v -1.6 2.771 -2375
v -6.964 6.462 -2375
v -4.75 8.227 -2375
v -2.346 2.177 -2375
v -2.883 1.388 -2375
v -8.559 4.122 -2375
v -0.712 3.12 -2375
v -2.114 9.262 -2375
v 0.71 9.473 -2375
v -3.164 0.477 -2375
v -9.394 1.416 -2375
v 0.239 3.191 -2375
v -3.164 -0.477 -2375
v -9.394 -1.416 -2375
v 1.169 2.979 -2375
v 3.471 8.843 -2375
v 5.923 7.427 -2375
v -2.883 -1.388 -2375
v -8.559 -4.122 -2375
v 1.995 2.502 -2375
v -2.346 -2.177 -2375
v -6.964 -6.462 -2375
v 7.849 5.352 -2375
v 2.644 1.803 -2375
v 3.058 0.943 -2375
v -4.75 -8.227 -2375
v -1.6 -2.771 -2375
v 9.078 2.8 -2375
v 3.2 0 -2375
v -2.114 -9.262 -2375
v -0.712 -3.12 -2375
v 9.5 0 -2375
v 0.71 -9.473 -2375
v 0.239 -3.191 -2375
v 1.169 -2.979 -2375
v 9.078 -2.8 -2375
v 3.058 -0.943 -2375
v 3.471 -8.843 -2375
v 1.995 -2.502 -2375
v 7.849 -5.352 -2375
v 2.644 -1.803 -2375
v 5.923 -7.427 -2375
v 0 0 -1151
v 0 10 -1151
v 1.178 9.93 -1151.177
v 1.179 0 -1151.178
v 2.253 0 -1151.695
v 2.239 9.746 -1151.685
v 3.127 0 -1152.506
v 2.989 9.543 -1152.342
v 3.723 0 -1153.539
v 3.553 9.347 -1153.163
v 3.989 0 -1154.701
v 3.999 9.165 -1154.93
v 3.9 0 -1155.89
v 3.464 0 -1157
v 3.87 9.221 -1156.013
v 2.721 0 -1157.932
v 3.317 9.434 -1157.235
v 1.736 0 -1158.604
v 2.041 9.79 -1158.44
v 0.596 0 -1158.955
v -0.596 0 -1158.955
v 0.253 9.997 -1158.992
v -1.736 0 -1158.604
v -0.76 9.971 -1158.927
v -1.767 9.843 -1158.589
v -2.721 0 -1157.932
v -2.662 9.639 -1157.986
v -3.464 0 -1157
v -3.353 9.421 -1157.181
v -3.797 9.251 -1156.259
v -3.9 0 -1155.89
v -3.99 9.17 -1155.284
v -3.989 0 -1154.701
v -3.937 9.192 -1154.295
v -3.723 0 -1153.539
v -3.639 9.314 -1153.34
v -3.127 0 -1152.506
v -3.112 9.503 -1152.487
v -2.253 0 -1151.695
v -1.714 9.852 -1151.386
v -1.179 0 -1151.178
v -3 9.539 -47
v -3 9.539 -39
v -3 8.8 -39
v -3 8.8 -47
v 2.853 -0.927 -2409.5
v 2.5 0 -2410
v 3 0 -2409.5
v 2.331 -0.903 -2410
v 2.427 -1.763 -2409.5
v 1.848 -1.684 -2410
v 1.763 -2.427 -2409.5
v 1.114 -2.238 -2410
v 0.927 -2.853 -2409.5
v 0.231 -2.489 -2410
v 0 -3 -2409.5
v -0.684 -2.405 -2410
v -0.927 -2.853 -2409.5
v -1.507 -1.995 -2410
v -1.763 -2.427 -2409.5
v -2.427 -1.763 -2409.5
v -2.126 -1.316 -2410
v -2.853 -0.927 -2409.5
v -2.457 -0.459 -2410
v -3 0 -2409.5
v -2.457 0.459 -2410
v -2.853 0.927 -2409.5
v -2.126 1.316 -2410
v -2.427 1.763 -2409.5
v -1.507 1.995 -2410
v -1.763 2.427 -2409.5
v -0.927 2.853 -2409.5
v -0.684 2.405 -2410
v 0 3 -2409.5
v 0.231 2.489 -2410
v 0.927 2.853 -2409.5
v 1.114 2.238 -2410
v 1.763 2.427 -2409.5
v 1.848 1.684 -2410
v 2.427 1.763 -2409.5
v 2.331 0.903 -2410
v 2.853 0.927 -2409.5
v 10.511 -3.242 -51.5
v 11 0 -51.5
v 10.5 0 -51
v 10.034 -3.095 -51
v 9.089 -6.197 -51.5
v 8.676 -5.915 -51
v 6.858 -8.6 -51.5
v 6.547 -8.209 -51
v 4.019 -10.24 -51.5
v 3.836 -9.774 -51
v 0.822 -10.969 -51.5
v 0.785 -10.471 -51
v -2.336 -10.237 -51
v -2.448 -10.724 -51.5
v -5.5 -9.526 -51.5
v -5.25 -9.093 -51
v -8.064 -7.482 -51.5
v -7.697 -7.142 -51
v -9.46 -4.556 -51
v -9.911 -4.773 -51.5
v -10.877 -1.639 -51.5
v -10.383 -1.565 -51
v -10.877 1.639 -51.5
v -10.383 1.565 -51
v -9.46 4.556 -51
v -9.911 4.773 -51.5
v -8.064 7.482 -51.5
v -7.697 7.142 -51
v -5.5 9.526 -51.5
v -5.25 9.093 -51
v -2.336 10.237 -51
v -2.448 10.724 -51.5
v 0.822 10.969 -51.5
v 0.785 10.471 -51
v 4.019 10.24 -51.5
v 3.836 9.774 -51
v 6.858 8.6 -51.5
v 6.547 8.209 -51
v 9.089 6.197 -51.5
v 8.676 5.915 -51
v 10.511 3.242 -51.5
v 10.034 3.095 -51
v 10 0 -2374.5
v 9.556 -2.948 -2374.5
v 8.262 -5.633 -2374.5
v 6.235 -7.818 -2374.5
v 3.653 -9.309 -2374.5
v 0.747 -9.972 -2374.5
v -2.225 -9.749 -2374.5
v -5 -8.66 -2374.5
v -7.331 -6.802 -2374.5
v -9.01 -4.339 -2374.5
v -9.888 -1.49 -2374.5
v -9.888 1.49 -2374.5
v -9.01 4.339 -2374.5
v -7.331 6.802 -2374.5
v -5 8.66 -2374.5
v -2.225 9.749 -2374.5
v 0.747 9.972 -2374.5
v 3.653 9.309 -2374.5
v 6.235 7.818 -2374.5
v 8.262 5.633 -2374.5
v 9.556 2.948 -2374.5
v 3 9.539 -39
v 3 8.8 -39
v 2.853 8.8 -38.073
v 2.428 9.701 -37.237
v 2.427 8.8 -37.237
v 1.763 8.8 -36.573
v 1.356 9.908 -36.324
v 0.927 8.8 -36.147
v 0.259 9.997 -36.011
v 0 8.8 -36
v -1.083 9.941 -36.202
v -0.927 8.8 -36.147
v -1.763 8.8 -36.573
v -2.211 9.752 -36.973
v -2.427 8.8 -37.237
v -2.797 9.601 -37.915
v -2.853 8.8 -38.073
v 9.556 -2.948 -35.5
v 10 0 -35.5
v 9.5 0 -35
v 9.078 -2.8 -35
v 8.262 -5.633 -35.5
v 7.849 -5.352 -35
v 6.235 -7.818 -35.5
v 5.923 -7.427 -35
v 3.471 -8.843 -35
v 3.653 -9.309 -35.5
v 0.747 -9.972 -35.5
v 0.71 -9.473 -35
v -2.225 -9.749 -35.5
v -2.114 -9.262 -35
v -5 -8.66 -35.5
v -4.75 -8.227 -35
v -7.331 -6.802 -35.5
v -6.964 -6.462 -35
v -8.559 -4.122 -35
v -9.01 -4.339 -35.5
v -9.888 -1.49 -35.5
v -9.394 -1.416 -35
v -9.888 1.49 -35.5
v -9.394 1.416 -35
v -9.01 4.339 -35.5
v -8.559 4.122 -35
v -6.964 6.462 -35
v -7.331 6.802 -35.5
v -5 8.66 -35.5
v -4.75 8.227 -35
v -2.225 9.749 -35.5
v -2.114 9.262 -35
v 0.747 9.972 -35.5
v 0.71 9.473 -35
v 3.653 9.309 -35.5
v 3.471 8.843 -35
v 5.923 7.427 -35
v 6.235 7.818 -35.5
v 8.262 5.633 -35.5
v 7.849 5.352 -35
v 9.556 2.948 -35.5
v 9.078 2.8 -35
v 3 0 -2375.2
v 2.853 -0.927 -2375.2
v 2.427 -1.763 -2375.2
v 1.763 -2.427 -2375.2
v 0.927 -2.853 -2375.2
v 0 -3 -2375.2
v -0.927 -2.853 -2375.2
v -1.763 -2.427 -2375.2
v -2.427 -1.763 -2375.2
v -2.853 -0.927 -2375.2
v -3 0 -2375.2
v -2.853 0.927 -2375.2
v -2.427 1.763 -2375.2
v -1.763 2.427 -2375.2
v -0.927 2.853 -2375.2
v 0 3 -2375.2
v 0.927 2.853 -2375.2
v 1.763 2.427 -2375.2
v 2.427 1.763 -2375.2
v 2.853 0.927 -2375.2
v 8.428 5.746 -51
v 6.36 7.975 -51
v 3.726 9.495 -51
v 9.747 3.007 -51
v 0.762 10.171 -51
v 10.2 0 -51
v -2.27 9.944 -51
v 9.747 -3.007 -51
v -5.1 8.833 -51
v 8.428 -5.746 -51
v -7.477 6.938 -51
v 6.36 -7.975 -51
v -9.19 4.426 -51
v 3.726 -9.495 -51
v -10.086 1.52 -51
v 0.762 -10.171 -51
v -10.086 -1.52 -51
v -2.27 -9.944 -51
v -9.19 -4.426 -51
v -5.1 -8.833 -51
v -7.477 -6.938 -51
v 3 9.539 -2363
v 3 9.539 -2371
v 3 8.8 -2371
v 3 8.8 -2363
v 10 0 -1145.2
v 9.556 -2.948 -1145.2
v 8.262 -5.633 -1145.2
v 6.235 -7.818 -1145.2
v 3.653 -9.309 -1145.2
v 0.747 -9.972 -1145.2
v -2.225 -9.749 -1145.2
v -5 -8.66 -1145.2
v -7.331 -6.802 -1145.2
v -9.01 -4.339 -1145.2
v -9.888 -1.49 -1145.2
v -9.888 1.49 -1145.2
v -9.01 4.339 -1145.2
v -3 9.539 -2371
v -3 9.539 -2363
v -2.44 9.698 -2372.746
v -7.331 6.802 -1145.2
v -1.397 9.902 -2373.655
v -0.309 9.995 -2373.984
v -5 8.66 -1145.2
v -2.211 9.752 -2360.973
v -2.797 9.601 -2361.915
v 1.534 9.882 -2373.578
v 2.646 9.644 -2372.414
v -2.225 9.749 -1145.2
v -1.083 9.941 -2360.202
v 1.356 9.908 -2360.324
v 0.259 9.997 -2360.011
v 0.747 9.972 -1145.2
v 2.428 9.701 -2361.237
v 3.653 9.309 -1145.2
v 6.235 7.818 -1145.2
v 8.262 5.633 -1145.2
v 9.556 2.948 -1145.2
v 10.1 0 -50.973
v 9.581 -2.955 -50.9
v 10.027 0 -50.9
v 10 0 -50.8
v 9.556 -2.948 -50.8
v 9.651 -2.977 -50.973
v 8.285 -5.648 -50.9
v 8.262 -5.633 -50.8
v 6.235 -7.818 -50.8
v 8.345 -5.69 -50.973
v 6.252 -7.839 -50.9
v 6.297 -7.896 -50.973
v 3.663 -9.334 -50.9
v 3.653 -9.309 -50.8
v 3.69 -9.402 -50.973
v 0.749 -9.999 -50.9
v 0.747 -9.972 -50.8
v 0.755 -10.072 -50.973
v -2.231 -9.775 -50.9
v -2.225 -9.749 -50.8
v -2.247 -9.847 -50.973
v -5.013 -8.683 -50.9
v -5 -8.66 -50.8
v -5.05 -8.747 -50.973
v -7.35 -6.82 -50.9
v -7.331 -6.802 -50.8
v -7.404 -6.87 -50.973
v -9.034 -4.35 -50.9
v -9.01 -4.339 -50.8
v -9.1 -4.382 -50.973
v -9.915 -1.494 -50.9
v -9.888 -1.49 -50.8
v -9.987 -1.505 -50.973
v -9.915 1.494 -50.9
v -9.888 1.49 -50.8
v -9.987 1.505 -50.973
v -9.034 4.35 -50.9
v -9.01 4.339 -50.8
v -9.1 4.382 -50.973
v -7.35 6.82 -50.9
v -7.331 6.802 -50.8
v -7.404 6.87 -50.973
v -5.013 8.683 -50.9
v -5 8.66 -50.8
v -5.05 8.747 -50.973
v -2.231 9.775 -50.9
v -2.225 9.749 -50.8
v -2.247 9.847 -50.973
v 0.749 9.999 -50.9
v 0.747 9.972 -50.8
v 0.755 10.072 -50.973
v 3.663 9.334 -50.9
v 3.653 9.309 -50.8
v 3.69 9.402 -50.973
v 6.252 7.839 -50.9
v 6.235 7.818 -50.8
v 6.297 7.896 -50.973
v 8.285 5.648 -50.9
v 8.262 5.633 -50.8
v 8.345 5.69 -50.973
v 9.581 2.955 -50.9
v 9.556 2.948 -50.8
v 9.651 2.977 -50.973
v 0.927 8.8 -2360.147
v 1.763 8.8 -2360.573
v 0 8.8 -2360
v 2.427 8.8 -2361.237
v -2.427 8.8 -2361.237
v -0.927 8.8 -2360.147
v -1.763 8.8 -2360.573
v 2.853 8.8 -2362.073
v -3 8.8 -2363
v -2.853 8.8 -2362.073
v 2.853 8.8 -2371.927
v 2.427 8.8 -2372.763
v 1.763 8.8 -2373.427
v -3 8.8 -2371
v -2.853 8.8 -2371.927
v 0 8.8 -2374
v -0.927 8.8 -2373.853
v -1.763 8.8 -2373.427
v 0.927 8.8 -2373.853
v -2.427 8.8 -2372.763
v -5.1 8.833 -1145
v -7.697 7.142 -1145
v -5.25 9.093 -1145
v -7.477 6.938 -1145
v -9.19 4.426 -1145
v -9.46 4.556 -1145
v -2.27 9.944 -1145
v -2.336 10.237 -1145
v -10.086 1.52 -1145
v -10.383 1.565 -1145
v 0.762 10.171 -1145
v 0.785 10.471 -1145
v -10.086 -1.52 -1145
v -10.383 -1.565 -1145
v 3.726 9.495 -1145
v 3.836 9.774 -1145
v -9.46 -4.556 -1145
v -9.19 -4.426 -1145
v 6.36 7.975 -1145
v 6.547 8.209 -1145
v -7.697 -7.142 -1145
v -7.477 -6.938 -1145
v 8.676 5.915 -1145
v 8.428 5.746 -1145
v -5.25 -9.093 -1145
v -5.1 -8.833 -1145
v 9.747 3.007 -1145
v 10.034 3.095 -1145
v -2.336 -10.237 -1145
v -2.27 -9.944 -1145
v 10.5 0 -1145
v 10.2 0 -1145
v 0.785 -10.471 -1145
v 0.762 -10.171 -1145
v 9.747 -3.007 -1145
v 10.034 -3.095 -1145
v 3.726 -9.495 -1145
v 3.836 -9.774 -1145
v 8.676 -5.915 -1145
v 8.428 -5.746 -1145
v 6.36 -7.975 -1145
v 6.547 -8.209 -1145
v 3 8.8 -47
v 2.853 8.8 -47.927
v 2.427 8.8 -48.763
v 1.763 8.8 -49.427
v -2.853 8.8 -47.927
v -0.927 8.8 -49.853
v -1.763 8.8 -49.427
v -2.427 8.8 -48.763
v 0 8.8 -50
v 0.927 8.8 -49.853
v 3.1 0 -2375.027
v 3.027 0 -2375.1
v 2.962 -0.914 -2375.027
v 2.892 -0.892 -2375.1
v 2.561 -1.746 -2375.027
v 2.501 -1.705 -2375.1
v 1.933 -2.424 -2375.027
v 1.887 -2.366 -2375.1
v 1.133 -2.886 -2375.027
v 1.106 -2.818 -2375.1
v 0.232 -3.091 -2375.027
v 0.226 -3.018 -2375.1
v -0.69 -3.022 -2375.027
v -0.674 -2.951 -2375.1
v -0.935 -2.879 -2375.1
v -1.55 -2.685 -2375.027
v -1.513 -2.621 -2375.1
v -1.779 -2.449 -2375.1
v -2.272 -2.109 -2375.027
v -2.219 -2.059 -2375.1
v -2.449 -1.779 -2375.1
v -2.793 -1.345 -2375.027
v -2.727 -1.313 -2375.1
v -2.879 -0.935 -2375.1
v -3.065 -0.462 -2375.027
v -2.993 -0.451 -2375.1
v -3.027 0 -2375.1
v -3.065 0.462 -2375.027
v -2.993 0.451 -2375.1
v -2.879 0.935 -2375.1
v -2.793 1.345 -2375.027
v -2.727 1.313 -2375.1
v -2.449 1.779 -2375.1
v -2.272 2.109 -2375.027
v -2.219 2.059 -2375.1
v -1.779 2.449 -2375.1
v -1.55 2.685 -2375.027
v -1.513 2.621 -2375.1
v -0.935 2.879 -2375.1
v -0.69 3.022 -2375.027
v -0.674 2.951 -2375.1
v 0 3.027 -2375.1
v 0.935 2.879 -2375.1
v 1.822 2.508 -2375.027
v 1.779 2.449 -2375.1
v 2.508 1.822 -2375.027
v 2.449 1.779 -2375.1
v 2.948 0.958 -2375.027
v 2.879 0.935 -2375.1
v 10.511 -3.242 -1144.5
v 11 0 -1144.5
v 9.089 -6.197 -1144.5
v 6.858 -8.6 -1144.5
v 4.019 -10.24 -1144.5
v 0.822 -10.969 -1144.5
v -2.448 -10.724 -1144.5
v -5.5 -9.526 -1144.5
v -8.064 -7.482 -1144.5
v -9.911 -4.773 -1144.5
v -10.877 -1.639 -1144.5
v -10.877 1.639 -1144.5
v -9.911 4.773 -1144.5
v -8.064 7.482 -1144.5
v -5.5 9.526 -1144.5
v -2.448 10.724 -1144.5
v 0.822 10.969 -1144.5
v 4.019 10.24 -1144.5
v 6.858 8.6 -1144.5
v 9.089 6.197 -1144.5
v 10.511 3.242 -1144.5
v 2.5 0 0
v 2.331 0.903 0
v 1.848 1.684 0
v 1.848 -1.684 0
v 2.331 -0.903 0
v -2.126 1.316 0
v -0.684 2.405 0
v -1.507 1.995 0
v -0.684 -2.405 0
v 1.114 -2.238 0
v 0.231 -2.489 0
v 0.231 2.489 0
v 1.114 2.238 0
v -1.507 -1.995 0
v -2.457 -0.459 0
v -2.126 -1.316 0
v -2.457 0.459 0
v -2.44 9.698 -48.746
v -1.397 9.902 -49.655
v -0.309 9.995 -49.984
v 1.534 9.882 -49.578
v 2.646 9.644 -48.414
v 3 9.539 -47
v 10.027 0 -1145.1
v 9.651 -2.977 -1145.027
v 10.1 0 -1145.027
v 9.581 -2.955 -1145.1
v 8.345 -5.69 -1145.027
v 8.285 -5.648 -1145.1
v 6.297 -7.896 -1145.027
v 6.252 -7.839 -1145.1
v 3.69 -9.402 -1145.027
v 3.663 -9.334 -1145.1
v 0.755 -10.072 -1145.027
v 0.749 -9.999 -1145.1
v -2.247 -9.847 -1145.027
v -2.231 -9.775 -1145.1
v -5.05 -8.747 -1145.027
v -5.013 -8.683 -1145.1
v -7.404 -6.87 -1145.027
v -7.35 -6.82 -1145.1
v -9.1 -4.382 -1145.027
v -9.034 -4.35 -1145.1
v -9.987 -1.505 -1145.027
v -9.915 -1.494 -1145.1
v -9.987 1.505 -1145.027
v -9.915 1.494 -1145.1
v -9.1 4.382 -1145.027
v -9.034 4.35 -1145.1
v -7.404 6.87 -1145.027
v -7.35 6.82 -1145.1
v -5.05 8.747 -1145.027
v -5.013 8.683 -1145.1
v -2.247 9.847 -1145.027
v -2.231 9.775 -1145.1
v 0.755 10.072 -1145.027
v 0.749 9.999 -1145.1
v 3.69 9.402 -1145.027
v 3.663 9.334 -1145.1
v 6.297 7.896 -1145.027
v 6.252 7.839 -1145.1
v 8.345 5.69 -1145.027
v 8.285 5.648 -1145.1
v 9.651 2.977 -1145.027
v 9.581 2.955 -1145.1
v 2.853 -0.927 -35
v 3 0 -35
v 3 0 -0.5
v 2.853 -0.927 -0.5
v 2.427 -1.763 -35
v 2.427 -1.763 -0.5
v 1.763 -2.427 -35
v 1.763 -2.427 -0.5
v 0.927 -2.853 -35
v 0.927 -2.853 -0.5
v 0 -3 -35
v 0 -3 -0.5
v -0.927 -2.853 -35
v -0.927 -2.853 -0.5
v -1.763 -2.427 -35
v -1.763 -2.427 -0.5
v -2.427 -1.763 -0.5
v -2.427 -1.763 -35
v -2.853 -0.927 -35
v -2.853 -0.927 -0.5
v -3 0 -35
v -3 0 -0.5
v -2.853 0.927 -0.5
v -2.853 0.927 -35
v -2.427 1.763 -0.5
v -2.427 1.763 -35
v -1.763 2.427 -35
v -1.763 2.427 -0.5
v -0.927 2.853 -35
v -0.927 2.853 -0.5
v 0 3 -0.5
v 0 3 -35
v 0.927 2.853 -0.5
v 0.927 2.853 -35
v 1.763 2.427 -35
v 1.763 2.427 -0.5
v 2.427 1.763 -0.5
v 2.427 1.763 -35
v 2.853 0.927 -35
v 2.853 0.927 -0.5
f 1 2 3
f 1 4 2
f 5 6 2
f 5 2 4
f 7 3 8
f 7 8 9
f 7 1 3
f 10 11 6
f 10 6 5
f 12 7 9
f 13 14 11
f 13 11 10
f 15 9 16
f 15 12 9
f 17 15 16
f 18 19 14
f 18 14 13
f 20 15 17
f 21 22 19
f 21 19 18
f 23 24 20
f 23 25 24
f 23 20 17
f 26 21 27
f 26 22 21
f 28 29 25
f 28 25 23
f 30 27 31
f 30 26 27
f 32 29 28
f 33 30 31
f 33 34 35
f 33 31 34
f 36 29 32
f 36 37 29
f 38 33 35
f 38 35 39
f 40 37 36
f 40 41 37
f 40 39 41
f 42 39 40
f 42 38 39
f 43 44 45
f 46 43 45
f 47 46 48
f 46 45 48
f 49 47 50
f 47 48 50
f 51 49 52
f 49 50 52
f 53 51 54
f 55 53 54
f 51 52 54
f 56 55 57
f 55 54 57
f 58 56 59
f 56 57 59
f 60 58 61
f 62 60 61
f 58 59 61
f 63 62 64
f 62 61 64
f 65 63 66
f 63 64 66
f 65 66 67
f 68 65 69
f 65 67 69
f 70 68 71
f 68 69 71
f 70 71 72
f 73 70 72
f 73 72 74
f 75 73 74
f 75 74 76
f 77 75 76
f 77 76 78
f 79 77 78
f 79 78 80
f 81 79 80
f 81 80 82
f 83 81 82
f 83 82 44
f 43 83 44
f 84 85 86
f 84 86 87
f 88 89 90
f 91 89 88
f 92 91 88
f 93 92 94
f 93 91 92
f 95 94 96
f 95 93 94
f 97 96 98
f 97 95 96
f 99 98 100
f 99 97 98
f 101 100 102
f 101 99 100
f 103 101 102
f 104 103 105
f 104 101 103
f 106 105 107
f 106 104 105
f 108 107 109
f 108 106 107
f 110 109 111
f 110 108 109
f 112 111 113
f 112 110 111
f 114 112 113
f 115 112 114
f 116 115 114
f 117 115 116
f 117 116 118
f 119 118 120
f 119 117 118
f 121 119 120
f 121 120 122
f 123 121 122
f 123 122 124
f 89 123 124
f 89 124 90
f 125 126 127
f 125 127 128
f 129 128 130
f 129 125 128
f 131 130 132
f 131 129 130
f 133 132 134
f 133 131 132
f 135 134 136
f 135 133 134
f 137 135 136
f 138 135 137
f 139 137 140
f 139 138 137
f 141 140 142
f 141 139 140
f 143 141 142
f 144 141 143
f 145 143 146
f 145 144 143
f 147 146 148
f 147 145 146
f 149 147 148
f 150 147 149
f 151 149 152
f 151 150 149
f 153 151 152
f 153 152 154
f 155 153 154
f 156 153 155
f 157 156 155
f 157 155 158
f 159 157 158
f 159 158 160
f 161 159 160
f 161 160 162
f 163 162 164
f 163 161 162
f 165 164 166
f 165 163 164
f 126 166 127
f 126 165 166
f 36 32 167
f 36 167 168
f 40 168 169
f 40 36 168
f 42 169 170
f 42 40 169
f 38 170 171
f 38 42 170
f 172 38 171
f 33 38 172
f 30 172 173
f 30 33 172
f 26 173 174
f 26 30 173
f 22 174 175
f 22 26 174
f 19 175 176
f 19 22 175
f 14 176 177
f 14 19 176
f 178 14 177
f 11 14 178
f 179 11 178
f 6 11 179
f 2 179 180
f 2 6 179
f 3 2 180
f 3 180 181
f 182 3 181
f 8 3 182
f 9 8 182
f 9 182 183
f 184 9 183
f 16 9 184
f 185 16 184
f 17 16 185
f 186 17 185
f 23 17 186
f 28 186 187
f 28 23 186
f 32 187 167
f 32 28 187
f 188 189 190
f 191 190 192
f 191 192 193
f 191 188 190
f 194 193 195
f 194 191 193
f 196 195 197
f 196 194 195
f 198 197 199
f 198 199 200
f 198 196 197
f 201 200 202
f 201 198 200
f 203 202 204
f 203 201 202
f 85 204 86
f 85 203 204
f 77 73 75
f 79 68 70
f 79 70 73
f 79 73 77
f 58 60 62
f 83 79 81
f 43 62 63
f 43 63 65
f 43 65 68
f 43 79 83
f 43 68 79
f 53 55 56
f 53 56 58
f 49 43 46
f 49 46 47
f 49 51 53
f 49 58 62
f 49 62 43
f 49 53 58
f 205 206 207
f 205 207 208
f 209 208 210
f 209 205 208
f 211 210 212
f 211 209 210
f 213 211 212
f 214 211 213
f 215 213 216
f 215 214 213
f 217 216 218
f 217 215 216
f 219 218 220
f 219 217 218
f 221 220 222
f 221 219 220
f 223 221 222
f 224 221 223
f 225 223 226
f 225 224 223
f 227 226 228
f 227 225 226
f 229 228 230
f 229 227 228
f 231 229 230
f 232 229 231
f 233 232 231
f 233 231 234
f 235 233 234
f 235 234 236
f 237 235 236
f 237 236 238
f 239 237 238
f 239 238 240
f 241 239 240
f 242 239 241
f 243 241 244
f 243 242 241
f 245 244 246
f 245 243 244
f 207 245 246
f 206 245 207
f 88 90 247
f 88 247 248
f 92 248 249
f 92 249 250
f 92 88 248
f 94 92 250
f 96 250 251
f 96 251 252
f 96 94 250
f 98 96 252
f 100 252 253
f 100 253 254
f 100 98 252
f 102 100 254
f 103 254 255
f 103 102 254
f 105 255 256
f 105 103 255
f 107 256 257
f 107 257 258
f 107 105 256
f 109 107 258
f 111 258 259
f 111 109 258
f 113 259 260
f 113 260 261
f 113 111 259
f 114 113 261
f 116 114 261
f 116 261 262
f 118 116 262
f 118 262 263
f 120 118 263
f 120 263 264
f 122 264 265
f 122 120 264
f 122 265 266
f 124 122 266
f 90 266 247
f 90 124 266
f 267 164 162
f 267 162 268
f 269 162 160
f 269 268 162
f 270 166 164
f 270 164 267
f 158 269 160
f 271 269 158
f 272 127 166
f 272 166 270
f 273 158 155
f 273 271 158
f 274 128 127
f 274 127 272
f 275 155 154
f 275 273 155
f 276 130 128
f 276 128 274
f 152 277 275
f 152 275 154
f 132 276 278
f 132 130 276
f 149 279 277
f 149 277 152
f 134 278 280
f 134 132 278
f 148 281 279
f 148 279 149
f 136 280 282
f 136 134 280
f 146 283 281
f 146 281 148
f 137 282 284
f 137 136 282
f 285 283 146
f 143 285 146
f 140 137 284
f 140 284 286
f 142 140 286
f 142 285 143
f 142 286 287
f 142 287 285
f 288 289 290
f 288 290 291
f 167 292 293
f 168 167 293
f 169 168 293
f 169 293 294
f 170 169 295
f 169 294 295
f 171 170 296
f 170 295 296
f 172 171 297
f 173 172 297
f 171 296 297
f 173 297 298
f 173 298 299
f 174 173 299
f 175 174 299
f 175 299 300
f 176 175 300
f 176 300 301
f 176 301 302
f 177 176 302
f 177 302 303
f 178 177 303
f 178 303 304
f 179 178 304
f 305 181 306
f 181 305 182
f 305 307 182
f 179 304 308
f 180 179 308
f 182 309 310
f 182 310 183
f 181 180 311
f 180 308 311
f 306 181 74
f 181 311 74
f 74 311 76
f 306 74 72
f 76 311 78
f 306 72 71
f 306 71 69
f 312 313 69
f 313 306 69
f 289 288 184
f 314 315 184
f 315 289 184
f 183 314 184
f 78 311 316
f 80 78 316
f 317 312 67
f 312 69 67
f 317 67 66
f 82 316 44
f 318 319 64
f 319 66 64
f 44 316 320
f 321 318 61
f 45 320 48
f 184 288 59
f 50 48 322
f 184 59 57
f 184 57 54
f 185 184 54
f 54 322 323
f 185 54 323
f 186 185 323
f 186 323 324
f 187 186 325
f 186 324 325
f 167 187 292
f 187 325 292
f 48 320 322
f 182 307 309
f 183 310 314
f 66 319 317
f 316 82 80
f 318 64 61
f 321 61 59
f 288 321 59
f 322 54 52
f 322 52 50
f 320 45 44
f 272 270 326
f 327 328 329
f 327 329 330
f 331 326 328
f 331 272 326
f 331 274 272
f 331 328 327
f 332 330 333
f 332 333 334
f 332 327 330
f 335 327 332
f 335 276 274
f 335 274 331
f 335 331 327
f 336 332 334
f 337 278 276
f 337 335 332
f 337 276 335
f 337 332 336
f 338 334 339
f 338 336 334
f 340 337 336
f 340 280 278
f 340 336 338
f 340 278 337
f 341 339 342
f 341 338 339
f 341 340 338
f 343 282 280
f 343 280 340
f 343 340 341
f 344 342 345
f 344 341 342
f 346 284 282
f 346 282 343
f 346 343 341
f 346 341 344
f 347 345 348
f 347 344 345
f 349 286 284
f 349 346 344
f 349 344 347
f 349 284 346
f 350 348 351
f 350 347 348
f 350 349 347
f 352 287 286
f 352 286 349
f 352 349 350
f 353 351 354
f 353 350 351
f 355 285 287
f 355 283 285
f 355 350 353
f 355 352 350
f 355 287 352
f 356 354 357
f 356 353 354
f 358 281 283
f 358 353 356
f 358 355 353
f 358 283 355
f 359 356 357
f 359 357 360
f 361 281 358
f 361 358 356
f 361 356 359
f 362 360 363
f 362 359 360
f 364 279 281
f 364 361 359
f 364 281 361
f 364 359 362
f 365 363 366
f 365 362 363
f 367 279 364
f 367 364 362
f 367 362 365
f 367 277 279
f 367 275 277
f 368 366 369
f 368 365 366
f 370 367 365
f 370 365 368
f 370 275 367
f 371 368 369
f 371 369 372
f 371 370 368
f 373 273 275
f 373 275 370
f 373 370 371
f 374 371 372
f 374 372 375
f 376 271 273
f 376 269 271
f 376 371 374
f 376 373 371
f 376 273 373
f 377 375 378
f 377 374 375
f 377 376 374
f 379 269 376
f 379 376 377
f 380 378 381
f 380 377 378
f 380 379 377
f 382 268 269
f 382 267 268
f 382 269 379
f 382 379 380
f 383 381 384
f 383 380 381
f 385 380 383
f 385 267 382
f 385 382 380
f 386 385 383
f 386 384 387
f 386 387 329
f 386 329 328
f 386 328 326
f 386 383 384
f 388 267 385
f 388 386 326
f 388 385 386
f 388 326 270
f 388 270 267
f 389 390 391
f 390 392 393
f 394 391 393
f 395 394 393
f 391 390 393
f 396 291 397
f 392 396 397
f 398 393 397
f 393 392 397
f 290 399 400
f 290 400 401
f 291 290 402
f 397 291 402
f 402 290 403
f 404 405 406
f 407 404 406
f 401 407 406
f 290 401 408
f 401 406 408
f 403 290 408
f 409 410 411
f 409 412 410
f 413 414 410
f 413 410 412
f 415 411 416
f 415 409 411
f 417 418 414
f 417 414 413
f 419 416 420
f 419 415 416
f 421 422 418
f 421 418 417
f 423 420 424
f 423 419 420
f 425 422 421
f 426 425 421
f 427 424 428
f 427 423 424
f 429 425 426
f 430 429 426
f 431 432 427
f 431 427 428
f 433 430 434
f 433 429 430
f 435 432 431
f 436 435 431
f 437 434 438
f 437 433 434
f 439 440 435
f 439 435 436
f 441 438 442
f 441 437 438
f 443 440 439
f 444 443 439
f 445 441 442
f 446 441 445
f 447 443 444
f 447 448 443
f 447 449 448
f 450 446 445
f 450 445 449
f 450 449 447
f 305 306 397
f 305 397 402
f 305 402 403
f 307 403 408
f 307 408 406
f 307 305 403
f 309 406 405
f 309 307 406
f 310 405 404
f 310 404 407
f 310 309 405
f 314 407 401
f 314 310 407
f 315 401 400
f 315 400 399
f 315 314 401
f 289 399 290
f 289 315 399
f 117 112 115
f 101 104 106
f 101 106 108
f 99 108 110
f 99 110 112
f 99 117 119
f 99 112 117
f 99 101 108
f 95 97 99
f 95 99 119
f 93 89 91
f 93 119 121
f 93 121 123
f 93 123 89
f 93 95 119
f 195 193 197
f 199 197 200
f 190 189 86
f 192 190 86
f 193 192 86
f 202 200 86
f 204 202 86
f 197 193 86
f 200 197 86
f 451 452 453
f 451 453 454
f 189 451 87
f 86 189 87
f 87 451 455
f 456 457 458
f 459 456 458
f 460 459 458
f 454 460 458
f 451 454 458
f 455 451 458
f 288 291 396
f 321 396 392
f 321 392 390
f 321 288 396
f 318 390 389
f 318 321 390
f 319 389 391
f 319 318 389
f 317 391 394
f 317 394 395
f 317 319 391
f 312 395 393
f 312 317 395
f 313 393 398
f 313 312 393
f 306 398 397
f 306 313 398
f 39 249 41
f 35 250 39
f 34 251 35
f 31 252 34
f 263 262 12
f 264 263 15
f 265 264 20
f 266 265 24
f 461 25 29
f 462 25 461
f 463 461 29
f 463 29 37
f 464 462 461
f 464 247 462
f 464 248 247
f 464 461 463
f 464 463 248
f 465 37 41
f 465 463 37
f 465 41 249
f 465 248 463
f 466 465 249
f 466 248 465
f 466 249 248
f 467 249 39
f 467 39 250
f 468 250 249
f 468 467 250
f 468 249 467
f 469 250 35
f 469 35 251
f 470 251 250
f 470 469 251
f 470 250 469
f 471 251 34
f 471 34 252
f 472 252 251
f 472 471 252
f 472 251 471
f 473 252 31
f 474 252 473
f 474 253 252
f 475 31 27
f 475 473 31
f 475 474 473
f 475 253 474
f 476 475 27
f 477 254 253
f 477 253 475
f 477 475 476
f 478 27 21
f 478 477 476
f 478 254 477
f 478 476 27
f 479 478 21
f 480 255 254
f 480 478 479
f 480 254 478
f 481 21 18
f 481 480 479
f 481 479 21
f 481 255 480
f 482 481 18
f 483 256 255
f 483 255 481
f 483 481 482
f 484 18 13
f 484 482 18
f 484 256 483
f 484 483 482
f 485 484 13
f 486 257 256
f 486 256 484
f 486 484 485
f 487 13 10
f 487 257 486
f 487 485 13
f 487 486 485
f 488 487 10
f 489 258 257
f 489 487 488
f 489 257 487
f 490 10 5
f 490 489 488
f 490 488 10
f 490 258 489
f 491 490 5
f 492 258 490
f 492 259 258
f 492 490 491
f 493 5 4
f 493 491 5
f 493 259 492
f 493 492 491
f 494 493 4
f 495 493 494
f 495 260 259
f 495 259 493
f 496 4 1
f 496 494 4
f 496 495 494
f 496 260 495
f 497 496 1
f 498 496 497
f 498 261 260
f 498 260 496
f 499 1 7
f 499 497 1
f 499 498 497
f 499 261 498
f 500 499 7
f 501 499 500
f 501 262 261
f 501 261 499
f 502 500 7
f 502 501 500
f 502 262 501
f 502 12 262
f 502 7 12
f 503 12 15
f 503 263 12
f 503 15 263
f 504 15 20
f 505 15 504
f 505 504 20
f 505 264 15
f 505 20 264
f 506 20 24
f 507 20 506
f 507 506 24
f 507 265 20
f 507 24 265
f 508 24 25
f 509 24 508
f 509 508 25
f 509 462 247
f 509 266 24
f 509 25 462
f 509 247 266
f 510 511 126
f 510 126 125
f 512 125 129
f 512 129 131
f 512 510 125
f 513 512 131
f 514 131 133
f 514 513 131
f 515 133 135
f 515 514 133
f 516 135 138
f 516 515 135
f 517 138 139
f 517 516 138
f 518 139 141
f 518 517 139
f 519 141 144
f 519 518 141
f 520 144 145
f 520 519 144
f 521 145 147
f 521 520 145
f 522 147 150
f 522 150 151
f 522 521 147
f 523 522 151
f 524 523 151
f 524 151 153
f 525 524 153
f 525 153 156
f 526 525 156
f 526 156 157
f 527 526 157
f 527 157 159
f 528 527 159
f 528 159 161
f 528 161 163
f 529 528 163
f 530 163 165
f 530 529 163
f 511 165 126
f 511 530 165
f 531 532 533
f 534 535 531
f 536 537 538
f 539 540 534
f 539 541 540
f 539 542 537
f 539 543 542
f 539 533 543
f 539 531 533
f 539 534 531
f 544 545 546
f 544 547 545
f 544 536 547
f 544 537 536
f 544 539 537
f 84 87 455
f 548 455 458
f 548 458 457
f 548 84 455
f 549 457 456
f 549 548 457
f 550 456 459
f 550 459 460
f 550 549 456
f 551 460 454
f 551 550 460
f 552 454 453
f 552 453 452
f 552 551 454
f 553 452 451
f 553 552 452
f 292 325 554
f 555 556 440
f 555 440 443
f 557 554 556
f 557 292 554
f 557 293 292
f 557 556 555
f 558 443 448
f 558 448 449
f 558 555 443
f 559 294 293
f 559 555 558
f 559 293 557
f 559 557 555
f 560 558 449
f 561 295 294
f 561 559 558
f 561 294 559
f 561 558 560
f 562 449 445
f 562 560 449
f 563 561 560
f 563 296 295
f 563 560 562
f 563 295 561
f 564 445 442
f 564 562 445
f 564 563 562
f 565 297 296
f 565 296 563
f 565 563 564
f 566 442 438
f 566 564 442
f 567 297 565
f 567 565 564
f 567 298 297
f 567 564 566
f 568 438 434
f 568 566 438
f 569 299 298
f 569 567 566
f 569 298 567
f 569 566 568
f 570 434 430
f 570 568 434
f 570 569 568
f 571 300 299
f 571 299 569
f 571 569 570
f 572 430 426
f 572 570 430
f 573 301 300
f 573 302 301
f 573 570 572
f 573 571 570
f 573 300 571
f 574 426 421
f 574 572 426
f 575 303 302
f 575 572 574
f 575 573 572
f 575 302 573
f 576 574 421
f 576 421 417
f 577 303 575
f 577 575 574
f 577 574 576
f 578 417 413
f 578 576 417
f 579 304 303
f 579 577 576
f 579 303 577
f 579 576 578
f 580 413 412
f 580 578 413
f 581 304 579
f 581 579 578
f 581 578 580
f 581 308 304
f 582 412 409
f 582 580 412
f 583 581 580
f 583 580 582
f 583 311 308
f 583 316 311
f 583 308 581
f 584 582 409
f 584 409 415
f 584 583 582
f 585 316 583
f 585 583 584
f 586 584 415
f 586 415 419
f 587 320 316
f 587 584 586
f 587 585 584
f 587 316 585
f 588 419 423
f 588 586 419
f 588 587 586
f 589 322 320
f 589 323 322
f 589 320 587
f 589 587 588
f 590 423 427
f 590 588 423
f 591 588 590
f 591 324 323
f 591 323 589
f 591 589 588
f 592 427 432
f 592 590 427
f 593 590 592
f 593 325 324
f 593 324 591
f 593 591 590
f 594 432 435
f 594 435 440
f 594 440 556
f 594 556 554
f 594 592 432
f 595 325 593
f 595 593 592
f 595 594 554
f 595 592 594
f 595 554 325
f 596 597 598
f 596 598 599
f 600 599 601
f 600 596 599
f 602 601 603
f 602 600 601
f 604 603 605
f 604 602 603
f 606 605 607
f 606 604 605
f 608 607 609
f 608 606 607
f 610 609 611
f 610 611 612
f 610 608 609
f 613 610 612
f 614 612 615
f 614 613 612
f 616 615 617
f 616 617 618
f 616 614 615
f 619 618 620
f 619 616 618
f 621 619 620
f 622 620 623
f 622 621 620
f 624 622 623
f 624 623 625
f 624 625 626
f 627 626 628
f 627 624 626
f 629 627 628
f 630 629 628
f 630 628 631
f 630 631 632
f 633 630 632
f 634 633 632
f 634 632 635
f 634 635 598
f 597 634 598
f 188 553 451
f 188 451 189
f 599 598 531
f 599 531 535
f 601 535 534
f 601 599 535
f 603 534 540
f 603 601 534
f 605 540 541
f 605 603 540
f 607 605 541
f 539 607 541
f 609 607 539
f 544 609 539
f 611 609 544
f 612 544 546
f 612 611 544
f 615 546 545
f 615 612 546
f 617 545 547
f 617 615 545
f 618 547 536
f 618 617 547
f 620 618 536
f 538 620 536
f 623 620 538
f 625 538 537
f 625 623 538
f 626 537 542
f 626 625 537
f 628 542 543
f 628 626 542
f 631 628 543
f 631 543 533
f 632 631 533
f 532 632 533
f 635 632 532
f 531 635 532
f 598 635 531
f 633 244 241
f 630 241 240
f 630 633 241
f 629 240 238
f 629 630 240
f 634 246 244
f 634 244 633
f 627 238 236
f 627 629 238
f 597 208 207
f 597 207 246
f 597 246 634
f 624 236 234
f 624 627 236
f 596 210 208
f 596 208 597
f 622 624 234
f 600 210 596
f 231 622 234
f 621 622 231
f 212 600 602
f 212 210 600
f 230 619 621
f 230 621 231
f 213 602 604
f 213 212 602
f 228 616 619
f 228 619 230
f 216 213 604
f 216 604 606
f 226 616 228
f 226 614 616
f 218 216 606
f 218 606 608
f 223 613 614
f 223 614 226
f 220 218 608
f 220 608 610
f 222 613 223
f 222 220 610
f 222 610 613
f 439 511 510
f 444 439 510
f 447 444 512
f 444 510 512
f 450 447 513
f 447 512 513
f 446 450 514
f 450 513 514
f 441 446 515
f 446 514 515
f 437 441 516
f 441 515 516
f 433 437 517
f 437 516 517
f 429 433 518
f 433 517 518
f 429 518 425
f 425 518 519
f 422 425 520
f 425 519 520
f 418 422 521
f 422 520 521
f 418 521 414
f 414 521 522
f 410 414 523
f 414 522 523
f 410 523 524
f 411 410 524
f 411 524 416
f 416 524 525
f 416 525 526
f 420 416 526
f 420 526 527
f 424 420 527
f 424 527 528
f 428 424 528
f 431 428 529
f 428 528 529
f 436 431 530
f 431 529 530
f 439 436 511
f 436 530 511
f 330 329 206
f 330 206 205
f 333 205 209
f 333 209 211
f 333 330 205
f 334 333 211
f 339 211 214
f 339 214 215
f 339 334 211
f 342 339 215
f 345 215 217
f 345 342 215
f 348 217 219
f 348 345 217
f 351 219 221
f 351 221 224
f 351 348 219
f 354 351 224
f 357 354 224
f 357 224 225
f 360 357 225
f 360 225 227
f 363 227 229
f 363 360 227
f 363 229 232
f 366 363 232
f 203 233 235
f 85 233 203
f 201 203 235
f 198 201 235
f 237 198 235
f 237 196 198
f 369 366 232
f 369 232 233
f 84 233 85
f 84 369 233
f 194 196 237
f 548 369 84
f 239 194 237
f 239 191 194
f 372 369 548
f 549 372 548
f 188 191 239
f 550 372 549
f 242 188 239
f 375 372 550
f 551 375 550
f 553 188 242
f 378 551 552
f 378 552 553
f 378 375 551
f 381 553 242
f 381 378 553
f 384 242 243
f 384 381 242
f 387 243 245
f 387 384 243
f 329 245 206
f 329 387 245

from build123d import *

# Parameters (mm, degrees)
CUT_EXTRUDE_1_DEPTH = 1.2
CUT_EXTRUDE_2_DEPTH = 1.2
SKETCH_4_R          = 4
CUT_EXTRUDE_3_DEPTH = 10
CHAMFER_1_SIZE      = 0.5
FILLET_1_R          = 0.2
FILLET_2_R          = 0.2
CHAMFER_2_SIZE      = 0.5
CHAMFER_3_SIZE      = 0.5
FILLET_3_R          = 0.2


with BuildPart() as part:
    # Эскиз1 → Повернуть1 (revolve)
    with BuildSketch(Plane(origin=(0, 0, 0), x_dir=(0, 0, -1), z_dir=(1, 0, 0)), mode=Mode.PRIVATE) as revolve_1_sk:
        Polygon((0, 0), (0, 3), (35, 3), (35, 10), (51, 10), (51, 11), (1145, 11), (1145, 10), (1185, 10), (2375, 10), (2375, 3), (2410, 3), (2410, 0), align=None)
    revolve(revolve_1_sk.sketch.rotate(Axis((0, 0, 0), (0, 0, -1)), 90), axis=Axis((0, 0, 0), (0, 0, -1)))

    # Эскиз2 → Вырез-Вытянуть1 (cut)
    with BuildSketch(Plane(origin=(0, 10, 0), x_dir=(1, 0, 0), z_dir=(0, 1, 0))):
        with BuildLine():
            Line((3, 47), (3, 39))
            ThreePointArc((3, 39), (0, 36), (-3, 39))
            Line((-3, 39), (-3, 47))
            ThreePointArc((-3, 47), (0, 50), (3, 47))
        make_face()
    extrude(amount=-CUT_EXTRUDE_1_DEPTH, mode=Mode.SUBTRACT)

    # Эскиз3 → Вырез-Вытянуть2 (cut)
    with BuildSketch(Plane(origin=(0, 10, 0), x_dir=(1, 0, 0), z_dir=(0, 1, 0))):
        with BuildLine():
            Line((3, 2371), (3, 2363))
            ThreePointArc((3, 2363), (0, 2360), (-3, 2363))
            Line((-3, 2363), (-3, 2371))
            ThreePointArc((-3, 2371), (0, 2374), (3, 2371))
        make_face()
    extrude(amount=-CUT_EXTRUDE_2_DEPTH, mode=Mode.SUBTRACT)

    # Эскиз4 → Вырез-Вытянуть3 (cut)
    with BuildSketch(Plane(origin=(0, 10, 0), x_dir=(1, 0, 0), z_dir=(0, 1, 0))):
        with Locations(Location((0, 1155, 0), (0, 0, 270))):
            Circle(SKETCH_4_R)
    extrude(amount=-CUT_EXTRUDE_3_DEPTH, mode=Mode.SUBTRACT)

    # Фаска1
    chamfer_1_edges = [part.edges().sort_by_distance(p)[0] for p in [
        (-3, 0, 0),
        (-10, 0, -35),
        (-11, 0, -51),
    ]]
    chamfer(chamfer_1_edges, length=CHAMFER_1_SIZE)

    # Скругление1
    fillet_1_edges = [part.edges().sort_by_distance(p)[0] for p in [
        (-10, 0, -51),
    ]]
    fillet(fillet_1_edges, radius=FILLET_1_R)

    # Скругление2
    fillet_2_edges = [part.edges().sort_by_distance(p)[0] for p in [
        (-10, 0, -1145),
    ]]
    fillet(fillet_2_edges, radius=FILLET_2_R)

    # Фаска2
    chamfer_2_edges = [part.edges().sort_by_distance(p)[0] for p in [
        (-11, 0, -1145),
    ]]
    chamfer(chamfer_2_edges, length=CHAMFER_2_SIZE)

    # Фаска3
    chamfer_3_edges = [part.edges().sort_by_distance(p)[0] for p in [
        (-10, 0, -2375),
        (-3, 0, -2410),
    ]]
    chamfer(chamfer_3_edges, length=CHAMFER_3_SIZE)

    # Скругление3
    fillet_3_edges = [part.edges().sort_by_distance(p)[0] for p in [
        (-3, 0, -2375),
    ]]
    fillet(fillet_3_edges, radius=FILLET_3_R)


solid = part.part
